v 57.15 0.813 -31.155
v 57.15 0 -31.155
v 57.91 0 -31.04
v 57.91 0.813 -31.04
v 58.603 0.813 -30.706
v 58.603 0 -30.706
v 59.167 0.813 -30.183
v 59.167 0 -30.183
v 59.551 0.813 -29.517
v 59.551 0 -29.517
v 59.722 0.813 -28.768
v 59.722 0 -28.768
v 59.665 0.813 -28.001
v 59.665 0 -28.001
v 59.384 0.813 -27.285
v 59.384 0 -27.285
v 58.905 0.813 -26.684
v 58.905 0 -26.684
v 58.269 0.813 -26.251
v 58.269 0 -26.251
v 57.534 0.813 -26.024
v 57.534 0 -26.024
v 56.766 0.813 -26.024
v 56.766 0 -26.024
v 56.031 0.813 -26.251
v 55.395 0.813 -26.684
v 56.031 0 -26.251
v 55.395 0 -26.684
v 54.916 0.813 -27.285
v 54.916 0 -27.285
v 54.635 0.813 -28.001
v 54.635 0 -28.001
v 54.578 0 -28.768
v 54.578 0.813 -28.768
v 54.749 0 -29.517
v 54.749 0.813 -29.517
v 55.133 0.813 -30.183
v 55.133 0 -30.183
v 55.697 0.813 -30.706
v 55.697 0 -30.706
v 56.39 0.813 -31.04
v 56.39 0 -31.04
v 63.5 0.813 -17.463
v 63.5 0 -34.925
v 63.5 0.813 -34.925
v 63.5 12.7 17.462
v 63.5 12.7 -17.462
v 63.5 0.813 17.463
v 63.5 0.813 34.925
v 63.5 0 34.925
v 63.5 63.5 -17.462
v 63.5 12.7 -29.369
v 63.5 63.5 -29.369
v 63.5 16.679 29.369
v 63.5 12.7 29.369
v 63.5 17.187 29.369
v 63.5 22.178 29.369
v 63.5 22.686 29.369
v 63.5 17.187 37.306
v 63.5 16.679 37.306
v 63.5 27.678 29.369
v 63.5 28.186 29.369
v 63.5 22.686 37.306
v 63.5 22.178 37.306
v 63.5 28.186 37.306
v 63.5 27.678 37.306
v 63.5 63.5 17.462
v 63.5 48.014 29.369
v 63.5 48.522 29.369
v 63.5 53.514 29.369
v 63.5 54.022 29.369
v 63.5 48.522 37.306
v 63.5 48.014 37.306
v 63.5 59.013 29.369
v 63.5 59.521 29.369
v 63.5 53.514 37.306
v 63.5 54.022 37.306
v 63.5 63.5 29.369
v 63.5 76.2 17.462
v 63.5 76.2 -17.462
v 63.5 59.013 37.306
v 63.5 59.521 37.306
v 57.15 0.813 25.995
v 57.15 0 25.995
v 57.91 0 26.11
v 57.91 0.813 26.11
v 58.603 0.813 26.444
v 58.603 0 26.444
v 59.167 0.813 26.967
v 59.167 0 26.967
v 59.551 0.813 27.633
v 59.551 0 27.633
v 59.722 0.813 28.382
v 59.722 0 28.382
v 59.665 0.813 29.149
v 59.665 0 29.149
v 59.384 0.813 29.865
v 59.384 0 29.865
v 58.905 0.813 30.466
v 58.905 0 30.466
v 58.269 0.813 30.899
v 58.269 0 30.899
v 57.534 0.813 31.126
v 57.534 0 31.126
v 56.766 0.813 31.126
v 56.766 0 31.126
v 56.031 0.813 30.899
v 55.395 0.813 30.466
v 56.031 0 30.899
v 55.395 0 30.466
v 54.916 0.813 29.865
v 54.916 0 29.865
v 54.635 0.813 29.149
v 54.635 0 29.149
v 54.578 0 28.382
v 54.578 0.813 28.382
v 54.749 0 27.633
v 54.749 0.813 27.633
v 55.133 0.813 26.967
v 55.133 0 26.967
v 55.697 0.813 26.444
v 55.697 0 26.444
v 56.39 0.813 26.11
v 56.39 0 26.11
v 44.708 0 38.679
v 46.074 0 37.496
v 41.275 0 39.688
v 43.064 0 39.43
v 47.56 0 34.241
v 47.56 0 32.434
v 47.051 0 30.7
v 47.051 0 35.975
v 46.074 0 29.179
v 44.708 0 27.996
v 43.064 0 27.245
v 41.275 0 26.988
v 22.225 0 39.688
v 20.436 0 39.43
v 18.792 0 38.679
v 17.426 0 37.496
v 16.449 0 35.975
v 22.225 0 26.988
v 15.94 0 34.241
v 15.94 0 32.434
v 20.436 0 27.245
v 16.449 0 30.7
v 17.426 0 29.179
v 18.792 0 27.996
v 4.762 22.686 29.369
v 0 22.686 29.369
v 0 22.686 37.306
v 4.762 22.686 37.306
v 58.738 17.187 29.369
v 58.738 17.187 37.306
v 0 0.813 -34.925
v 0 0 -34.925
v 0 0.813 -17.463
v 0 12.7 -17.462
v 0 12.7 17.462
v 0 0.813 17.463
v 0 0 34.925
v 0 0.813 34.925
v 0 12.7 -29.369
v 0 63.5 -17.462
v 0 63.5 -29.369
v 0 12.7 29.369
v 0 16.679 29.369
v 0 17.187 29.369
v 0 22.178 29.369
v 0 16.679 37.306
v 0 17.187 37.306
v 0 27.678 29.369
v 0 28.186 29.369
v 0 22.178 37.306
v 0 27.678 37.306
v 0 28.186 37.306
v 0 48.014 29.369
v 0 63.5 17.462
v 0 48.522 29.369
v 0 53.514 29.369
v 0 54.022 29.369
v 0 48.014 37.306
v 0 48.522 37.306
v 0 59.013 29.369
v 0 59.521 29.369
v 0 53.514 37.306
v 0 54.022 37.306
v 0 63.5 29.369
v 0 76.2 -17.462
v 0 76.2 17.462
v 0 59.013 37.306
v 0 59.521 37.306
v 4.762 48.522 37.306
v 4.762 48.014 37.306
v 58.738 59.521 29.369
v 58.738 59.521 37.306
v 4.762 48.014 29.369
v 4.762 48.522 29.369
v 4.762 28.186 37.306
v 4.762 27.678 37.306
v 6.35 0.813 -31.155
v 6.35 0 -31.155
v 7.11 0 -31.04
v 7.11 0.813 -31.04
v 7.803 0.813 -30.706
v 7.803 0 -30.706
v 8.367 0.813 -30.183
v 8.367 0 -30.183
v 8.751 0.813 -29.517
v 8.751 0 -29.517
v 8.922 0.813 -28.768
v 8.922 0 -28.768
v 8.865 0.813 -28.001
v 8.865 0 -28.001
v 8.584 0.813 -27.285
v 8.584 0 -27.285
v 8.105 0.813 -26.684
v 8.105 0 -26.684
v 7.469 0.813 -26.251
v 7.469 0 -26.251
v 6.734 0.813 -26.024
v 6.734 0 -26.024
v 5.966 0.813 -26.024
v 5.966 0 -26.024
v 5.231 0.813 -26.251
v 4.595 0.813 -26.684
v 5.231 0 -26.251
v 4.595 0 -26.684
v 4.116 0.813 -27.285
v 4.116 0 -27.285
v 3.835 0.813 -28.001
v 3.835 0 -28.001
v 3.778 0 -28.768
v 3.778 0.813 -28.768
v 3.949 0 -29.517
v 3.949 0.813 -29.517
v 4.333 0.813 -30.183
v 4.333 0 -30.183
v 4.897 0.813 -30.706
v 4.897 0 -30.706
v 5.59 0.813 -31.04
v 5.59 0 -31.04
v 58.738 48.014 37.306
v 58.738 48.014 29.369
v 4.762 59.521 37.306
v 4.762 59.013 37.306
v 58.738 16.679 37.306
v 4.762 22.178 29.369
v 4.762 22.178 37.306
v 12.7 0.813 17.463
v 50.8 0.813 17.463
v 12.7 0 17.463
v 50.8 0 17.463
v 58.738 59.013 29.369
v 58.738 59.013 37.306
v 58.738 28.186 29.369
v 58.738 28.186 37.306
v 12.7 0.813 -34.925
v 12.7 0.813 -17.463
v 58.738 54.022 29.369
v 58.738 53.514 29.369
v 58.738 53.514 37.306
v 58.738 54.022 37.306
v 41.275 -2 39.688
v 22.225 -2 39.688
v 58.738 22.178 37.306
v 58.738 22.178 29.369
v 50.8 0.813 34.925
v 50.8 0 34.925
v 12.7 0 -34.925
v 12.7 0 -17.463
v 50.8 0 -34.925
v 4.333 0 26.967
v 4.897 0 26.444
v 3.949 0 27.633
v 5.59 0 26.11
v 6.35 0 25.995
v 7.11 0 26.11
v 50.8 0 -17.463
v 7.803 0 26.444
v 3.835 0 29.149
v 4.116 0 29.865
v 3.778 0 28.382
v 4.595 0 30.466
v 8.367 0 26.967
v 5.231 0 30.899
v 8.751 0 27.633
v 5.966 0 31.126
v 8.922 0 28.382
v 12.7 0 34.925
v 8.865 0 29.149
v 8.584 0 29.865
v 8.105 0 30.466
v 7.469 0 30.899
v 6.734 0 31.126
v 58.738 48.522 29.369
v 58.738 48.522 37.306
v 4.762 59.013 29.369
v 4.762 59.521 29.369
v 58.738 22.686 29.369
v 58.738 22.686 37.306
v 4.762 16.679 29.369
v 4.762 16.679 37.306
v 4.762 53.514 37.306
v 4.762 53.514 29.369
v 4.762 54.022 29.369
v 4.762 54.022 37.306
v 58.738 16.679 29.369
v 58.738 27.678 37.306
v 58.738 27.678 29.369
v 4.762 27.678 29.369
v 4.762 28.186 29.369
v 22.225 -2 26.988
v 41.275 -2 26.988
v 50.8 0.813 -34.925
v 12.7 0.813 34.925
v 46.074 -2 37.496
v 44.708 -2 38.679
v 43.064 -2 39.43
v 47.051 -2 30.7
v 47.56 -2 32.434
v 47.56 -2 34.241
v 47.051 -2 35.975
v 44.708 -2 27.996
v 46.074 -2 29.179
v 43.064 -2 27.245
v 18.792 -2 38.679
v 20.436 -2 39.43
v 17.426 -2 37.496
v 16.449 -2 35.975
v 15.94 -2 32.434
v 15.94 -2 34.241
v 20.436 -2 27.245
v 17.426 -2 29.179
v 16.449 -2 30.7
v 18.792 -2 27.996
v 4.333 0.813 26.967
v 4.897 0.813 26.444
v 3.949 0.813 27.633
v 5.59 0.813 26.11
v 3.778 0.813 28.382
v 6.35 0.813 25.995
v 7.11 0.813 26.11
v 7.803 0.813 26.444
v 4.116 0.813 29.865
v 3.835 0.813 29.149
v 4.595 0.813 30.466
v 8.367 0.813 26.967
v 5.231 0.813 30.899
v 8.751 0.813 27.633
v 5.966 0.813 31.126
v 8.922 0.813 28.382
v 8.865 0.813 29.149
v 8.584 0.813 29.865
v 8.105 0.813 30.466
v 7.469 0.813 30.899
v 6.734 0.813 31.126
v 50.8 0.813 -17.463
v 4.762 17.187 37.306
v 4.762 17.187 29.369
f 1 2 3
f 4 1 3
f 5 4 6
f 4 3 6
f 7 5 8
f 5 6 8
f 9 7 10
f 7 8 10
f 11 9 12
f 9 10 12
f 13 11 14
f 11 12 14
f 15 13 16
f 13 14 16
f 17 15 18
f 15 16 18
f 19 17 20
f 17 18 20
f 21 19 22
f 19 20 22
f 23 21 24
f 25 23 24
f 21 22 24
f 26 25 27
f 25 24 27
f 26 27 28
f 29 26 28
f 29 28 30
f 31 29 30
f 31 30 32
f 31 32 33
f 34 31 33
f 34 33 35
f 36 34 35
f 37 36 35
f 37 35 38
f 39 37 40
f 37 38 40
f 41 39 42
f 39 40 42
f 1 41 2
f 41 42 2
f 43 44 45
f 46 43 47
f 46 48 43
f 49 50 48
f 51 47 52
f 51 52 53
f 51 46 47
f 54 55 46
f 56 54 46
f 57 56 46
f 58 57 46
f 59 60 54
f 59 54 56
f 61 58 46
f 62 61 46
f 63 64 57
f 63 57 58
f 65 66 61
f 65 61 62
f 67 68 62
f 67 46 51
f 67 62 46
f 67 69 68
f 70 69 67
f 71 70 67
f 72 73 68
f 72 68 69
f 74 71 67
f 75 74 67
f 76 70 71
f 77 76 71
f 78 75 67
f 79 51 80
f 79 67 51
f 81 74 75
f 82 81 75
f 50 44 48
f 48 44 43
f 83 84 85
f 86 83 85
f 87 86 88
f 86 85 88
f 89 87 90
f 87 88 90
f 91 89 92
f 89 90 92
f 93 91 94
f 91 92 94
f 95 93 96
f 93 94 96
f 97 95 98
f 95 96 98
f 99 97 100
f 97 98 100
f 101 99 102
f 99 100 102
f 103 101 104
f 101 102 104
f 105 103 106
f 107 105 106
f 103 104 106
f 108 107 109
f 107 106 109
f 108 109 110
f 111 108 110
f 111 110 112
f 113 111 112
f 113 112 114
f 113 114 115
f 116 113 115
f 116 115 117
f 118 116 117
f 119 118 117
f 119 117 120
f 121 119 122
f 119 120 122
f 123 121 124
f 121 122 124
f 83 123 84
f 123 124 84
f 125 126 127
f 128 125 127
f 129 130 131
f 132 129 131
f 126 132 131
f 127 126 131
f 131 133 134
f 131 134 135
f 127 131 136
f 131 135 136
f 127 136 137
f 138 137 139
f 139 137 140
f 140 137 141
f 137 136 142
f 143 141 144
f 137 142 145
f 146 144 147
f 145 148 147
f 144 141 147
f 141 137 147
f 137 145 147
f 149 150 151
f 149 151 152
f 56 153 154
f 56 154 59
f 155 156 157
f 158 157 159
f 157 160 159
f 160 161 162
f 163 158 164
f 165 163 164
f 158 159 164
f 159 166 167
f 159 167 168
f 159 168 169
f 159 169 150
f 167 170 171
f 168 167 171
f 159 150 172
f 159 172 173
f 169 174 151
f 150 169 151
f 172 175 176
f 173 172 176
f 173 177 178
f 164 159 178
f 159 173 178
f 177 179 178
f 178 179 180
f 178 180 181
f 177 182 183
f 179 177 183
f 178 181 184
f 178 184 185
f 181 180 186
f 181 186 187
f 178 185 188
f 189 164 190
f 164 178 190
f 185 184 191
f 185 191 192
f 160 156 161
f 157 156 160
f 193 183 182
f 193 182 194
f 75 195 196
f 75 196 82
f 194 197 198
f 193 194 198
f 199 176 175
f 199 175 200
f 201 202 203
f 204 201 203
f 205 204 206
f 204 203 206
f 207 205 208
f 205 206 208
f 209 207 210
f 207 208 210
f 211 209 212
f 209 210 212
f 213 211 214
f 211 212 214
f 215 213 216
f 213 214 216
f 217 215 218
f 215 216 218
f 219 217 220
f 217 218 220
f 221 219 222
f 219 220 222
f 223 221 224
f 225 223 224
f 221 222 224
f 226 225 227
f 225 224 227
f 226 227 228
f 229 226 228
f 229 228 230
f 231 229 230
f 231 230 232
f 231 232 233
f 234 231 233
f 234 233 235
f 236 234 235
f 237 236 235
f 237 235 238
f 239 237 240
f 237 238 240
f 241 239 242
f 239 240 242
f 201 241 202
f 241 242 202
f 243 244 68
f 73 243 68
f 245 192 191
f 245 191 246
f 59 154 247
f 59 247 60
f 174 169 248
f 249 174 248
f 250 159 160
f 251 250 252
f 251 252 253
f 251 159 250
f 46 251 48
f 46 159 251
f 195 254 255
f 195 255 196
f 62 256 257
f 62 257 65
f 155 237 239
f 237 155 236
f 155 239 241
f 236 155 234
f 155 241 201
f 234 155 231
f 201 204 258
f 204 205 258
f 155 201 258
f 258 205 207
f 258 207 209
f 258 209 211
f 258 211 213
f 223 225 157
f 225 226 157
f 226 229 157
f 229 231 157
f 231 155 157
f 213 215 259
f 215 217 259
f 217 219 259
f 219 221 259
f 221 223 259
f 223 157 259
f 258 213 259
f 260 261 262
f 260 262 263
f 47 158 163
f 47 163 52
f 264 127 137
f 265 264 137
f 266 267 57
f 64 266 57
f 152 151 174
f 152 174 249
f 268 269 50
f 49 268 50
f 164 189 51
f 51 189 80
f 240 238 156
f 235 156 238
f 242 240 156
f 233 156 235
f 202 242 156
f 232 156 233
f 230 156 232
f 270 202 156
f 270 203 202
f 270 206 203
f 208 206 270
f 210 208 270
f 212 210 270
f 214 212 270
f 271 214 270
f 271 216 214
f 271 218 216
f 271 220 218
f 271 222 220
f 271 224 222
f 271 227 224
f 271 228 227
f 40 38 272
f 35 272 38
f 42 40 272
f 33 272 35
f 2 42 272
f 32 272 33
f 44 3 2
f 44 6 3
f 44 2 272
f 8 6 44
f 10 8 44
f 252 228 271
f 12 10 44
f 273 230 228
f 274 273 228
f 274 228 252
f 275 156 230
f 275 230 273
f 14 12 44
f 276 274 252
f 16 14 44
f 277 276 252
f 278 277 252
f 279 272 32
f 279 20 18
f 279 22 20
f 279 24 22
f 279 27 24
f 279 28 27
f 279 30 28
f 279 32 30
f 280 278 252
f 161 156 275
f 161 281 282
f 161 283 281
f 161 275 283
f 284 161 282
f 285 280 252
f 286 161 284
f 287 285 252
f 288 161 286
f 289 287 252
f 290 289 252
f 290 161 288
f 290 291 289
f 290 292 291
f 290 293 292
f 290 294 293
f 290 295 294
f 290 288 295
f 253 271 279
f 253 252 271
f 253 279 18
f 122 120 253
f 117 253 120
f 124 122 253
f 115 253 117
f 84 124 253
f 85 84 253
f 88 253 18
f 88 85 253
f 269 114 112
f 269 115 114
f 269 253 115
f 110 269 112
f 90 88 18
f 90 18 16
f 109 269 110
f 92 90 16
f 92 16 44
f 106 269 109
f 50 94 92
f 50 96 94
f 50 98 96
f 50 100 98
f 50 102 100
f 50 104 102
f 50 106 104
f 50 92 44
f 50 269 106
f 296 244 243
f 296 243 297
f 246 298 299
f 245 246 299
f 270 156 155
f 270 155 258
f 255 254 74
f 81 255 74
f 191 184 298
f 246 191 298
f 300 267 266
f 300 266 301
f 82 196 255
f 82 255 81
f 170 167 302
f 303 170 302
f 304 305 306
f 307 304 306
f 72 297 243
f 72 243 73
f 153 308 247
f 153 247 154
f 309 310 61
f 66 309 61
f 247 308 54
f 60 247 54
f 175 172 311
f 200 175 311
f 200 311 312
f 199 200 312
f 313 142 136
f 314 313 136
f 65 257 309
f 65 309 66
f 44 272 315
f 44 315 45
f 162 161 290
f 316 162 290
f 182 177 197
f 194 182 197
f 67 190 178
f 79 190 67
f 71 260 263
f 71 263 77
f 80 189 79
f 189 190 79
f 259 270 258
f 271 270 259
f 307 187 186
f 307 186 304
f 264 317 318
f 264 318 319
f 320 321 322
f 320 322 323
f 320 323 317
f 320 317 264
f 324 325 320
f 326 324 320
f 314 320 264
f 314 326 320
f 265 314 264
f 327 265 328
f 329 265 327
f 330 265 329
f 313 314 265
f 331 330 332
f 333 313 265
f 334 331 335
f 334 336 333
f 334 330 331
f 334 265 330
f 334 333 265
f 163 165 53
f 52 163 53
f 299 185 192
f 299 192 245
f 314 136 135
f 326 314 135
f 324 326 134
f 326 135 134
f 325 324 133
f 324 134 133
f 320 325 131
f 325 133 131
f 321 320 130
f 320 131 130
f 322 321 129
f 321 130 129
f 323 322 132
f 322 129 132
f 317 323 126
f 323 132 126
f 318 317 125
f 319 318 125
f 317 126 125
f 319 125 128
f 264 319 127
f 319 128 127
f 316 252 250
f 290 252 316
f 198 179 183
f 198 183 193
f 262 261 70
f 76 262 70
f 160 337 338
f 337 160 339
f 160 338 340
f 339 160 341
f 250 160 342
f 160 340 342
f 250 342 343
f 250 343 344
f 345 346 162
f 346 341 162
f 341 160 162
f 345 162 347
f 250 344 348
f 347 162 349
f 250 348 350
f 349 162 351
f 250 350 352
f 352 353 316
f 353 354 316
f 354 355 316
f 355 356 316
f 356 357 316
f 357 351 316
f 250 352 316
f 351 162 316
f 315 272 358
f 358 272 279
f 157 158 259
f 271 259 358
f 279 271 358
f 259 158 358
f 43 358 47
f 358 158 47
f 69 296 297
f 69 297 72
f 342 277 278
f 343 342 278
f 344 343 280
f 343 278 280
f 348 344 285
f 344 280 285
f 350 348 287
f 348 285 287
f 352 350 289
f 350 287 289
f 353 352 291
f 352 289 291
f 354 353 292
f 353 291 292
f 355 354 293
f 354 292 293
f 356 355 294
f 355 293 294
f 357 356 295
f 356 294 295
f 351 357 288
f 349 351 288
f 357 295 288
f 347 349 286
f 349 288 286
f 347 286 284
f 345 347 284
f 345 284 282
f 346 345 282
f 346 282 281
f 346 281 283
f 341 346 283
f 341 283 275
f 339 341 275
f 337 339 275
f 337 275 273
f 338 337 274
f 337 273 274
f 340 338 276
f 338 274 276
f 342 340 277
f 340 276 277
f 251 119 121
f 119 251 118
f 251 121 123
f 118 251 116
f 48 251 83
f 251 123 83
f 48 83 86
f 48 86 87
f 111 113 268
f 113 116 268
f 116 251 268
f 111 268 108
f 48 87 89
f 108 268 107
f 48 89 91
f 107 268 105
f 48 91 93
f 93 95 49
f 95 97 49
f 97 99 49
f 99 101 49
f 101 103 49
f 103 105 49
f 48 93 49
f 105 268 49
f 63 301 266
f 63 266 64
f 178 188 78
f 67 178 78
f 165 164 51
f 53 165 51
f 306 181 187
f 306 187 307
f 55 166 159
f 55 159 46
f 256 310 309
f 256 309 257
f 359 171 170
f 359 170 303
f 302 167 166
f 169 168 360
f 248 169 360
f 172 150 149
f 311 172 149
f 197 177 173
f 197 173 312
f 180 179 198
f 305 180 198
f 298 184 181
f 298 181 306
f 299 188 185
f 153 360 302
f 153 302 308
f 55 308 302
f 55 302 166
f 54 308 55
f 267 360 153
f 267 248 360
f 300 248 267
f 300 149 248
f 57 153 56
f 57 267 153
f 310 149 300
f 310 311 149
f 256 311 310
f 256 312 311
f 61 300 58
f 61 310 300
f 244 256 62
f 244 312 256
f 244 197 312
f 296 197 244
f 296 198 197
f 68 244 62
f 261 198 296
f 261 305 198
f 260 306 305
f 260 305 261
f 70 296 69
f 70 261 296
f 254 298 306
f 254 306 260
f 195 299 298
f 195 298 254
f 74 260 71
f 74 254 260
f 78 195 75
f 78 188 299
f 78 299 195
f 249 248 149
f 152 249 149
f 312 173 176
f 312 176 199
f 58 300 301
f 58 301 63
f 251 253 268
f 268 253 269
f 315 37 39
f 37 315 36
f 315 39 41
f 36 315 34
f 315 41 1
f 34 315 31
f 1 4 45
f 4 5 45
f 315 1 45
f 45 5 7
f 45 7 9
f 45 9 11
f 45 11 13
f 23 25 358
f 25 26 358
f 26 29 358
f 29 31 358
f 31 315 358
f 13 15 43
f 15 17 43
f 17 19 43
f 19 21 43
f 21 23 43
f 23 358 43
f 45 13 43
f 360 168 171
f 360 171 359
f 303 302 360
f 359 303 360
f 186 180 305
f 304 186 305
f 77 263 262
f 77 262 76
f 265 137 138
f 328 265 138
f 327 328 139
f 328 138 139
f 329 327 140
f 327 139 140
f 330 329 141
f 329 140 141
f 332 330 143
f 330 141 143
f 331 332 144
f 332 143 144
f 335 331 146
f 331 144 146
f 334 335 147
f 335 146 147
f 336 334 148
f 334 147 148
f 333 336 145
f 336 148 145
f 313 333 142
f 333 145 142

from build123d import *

# Parameters (mm, degrees)
SKETCH1_W           = 63.5
SKETCH1_H           = 76.2
BOSS_EXTRUDE1_DEPTH = 17.4625
SKETCH2_W           = 63.5
SKETCH2_H           = 50.8
BOSS_EXTRUDE2_DEPTH = 29.36875
SKETCH3_W           = 12.7
SKETCH3_H           = 17.4625
SKETCH3_R           = 2.5796875
BOSS_EXTRUDE3_DEPTH = 0.8128
SKETCH4_W           = 4.7625
SKETCH4_H           = 0.508
BOSS_EXTRUDE4_DEPTH = 7.9375
BOSS_EXTRUDE5_DEPTH = 2


with BuildPart() as part:
    # Sketch1 → Boss-Extrude1 (new, symmetric)
    with BuildSketch(Plane.XY):
        with Locations((31.75, 38.1)):
            Rectangle(SKETCH1_W, SKETCH1_H)
    extrude(amount=BOSS_EXTRUDE1_DEPTH, both=True)

    # Sketch2 → Boss-Extrude2 (add, symmetric)
    with BuildSketch(Plane.XY):
        with Locations((31.75, 38.1)):
            Rectangle(SKETCH2_W, SKETCH2_H)
    extrude(amount=BOSS_EXTRUDE2_DEPTH, both=True)

    # Sketch3 → Boss-Extrude3 (add)
    # profile 1 of 4: a face of its own
    with BuildSketch(Plane.XZ):
        with Locations((57.15, 26.19375)):
            Rectangle(SKETCH3_W, SKETCH3_H)
        with Locations(Location((57.15, 28.575, 0), (0, 0, 270))):
            Circle(SKETCH3_R, mode=Mode.SUBTRACT)
    # profile 2 of 4: a face of its own
    with BuildSketch(Plane.XZ):
        with Locations((57.15, -26.19375)):
            Rectangle(SKETCH3_W, SKETCH3_H)
        with Locations(Location((57.15, -28.575, 0), (0, 0, 270))):
            Circle(SKETCH3_R, mode=Mode.SUBTRACT)
    # profile 3 of 4: a face of its own
    with BuildSketch(Plane.XZ):
        with Locations((6.35, -26.19375)):
            Rectangle(SKETCH3_W, SKETCH3_H)
        with Locations(Location((6.35, -28.575, 0), (0, 0, 270))):
            Circle(SKETCH3_R, mode=Mode.SUBTRACT)
    # profile 4 of 4: a face of its own
    with BuildSketch(Plane.XZ):
        with Locations((6.35, 26.19375)):
            Rectangle(SKETCH3_W, SKETCH3_H)
        with Locations(Location((6.35, 28.575, 0), (0, 0, 270))):
            Circle(SKETCH3_R, mode=Mode.SUBTRACT)
    extrude(amount=-BOSS_EXTRUDE3_DEPTH)

    # Sketch4 → Boss-Extrude4 (add)
    with BuildSketch(Plane.XY.offset(29.36875)):
        with Locations((2.38125, 59.266675133)):
            Rectangle(SKETCH4_W, SKETCH4_H)
        with Locations((2.38125, 53.767575133)):
            Rectangle(SKETCH4_W, SKETCH4_H)
        with Locations((2.38125, 48.268475133)):
            Rectangle(SKETCH4_W, SKETCH4_H)
        with Locations((61.11875, 48.268475133)):
            Rectangle(SKETCH4_W, SKETCH4_H)
        with Locations((61.11875, 53.767575133)):
            Rectangle(SKETCH4_W, SKETCH4_H)
        with Locations((61.11875, 59.266675133)):
            Rectangle(SKETCH4_W, SKETCH4_H)
        with Locations((61.11875, 16.933324867)):
            Rectangle(SKETCH4_W, SKETCH4_H)
        with Locations((61.11875, 22.432424867)):
            Rectangle(SKETCH4_W, SKETCH4_H)
        with Locations((61.11875, 27.931524867)):
            Rectangle(SKETCH4_W, SKETCH4_H)
        with Locations((2.38125, 27.931524867)):
            Rectangle(SKETCH4_W, SKETCH4_H)
        with Locations((2.38125, 22.432424867)):
            Rectangle(SKETCH4_W, SKETCH4_H)
        with Locations((2.38125, 16.933324867)):
            Rectangle(SKETCH4_W, SKETCH4_H)
    extrude(amount=BOSS_EXTRUDE4_DEPTH)


with BuildPart() as body_2:
    # Sketch5 → Boss-Extrude5 (new body)
    with BuildSketch(Plane(origin=(0, 0, 0), x_dir=(-1, 0, 0), z_dir=(0, -1, 0))):
        with BuildLine():
            Line((-41.275, -39.6875), (-22.225, -39.6875))
            ThreePointArc((-22.225, -39.6875), (-15.875, -33.3375), (-22.225, -26.9875))
            Line((-22.225, -26.9875), (-41.275, -26.9875))
            ThreePointArc((-41.275, -26.9875), (-47.625, -33.3375), (-41.275, -39.6875))
        make_face()
    extrude(amount=BOSS_EXTRUDE5_DEPTH)


solid = Compound([part.part, body_2.part])
